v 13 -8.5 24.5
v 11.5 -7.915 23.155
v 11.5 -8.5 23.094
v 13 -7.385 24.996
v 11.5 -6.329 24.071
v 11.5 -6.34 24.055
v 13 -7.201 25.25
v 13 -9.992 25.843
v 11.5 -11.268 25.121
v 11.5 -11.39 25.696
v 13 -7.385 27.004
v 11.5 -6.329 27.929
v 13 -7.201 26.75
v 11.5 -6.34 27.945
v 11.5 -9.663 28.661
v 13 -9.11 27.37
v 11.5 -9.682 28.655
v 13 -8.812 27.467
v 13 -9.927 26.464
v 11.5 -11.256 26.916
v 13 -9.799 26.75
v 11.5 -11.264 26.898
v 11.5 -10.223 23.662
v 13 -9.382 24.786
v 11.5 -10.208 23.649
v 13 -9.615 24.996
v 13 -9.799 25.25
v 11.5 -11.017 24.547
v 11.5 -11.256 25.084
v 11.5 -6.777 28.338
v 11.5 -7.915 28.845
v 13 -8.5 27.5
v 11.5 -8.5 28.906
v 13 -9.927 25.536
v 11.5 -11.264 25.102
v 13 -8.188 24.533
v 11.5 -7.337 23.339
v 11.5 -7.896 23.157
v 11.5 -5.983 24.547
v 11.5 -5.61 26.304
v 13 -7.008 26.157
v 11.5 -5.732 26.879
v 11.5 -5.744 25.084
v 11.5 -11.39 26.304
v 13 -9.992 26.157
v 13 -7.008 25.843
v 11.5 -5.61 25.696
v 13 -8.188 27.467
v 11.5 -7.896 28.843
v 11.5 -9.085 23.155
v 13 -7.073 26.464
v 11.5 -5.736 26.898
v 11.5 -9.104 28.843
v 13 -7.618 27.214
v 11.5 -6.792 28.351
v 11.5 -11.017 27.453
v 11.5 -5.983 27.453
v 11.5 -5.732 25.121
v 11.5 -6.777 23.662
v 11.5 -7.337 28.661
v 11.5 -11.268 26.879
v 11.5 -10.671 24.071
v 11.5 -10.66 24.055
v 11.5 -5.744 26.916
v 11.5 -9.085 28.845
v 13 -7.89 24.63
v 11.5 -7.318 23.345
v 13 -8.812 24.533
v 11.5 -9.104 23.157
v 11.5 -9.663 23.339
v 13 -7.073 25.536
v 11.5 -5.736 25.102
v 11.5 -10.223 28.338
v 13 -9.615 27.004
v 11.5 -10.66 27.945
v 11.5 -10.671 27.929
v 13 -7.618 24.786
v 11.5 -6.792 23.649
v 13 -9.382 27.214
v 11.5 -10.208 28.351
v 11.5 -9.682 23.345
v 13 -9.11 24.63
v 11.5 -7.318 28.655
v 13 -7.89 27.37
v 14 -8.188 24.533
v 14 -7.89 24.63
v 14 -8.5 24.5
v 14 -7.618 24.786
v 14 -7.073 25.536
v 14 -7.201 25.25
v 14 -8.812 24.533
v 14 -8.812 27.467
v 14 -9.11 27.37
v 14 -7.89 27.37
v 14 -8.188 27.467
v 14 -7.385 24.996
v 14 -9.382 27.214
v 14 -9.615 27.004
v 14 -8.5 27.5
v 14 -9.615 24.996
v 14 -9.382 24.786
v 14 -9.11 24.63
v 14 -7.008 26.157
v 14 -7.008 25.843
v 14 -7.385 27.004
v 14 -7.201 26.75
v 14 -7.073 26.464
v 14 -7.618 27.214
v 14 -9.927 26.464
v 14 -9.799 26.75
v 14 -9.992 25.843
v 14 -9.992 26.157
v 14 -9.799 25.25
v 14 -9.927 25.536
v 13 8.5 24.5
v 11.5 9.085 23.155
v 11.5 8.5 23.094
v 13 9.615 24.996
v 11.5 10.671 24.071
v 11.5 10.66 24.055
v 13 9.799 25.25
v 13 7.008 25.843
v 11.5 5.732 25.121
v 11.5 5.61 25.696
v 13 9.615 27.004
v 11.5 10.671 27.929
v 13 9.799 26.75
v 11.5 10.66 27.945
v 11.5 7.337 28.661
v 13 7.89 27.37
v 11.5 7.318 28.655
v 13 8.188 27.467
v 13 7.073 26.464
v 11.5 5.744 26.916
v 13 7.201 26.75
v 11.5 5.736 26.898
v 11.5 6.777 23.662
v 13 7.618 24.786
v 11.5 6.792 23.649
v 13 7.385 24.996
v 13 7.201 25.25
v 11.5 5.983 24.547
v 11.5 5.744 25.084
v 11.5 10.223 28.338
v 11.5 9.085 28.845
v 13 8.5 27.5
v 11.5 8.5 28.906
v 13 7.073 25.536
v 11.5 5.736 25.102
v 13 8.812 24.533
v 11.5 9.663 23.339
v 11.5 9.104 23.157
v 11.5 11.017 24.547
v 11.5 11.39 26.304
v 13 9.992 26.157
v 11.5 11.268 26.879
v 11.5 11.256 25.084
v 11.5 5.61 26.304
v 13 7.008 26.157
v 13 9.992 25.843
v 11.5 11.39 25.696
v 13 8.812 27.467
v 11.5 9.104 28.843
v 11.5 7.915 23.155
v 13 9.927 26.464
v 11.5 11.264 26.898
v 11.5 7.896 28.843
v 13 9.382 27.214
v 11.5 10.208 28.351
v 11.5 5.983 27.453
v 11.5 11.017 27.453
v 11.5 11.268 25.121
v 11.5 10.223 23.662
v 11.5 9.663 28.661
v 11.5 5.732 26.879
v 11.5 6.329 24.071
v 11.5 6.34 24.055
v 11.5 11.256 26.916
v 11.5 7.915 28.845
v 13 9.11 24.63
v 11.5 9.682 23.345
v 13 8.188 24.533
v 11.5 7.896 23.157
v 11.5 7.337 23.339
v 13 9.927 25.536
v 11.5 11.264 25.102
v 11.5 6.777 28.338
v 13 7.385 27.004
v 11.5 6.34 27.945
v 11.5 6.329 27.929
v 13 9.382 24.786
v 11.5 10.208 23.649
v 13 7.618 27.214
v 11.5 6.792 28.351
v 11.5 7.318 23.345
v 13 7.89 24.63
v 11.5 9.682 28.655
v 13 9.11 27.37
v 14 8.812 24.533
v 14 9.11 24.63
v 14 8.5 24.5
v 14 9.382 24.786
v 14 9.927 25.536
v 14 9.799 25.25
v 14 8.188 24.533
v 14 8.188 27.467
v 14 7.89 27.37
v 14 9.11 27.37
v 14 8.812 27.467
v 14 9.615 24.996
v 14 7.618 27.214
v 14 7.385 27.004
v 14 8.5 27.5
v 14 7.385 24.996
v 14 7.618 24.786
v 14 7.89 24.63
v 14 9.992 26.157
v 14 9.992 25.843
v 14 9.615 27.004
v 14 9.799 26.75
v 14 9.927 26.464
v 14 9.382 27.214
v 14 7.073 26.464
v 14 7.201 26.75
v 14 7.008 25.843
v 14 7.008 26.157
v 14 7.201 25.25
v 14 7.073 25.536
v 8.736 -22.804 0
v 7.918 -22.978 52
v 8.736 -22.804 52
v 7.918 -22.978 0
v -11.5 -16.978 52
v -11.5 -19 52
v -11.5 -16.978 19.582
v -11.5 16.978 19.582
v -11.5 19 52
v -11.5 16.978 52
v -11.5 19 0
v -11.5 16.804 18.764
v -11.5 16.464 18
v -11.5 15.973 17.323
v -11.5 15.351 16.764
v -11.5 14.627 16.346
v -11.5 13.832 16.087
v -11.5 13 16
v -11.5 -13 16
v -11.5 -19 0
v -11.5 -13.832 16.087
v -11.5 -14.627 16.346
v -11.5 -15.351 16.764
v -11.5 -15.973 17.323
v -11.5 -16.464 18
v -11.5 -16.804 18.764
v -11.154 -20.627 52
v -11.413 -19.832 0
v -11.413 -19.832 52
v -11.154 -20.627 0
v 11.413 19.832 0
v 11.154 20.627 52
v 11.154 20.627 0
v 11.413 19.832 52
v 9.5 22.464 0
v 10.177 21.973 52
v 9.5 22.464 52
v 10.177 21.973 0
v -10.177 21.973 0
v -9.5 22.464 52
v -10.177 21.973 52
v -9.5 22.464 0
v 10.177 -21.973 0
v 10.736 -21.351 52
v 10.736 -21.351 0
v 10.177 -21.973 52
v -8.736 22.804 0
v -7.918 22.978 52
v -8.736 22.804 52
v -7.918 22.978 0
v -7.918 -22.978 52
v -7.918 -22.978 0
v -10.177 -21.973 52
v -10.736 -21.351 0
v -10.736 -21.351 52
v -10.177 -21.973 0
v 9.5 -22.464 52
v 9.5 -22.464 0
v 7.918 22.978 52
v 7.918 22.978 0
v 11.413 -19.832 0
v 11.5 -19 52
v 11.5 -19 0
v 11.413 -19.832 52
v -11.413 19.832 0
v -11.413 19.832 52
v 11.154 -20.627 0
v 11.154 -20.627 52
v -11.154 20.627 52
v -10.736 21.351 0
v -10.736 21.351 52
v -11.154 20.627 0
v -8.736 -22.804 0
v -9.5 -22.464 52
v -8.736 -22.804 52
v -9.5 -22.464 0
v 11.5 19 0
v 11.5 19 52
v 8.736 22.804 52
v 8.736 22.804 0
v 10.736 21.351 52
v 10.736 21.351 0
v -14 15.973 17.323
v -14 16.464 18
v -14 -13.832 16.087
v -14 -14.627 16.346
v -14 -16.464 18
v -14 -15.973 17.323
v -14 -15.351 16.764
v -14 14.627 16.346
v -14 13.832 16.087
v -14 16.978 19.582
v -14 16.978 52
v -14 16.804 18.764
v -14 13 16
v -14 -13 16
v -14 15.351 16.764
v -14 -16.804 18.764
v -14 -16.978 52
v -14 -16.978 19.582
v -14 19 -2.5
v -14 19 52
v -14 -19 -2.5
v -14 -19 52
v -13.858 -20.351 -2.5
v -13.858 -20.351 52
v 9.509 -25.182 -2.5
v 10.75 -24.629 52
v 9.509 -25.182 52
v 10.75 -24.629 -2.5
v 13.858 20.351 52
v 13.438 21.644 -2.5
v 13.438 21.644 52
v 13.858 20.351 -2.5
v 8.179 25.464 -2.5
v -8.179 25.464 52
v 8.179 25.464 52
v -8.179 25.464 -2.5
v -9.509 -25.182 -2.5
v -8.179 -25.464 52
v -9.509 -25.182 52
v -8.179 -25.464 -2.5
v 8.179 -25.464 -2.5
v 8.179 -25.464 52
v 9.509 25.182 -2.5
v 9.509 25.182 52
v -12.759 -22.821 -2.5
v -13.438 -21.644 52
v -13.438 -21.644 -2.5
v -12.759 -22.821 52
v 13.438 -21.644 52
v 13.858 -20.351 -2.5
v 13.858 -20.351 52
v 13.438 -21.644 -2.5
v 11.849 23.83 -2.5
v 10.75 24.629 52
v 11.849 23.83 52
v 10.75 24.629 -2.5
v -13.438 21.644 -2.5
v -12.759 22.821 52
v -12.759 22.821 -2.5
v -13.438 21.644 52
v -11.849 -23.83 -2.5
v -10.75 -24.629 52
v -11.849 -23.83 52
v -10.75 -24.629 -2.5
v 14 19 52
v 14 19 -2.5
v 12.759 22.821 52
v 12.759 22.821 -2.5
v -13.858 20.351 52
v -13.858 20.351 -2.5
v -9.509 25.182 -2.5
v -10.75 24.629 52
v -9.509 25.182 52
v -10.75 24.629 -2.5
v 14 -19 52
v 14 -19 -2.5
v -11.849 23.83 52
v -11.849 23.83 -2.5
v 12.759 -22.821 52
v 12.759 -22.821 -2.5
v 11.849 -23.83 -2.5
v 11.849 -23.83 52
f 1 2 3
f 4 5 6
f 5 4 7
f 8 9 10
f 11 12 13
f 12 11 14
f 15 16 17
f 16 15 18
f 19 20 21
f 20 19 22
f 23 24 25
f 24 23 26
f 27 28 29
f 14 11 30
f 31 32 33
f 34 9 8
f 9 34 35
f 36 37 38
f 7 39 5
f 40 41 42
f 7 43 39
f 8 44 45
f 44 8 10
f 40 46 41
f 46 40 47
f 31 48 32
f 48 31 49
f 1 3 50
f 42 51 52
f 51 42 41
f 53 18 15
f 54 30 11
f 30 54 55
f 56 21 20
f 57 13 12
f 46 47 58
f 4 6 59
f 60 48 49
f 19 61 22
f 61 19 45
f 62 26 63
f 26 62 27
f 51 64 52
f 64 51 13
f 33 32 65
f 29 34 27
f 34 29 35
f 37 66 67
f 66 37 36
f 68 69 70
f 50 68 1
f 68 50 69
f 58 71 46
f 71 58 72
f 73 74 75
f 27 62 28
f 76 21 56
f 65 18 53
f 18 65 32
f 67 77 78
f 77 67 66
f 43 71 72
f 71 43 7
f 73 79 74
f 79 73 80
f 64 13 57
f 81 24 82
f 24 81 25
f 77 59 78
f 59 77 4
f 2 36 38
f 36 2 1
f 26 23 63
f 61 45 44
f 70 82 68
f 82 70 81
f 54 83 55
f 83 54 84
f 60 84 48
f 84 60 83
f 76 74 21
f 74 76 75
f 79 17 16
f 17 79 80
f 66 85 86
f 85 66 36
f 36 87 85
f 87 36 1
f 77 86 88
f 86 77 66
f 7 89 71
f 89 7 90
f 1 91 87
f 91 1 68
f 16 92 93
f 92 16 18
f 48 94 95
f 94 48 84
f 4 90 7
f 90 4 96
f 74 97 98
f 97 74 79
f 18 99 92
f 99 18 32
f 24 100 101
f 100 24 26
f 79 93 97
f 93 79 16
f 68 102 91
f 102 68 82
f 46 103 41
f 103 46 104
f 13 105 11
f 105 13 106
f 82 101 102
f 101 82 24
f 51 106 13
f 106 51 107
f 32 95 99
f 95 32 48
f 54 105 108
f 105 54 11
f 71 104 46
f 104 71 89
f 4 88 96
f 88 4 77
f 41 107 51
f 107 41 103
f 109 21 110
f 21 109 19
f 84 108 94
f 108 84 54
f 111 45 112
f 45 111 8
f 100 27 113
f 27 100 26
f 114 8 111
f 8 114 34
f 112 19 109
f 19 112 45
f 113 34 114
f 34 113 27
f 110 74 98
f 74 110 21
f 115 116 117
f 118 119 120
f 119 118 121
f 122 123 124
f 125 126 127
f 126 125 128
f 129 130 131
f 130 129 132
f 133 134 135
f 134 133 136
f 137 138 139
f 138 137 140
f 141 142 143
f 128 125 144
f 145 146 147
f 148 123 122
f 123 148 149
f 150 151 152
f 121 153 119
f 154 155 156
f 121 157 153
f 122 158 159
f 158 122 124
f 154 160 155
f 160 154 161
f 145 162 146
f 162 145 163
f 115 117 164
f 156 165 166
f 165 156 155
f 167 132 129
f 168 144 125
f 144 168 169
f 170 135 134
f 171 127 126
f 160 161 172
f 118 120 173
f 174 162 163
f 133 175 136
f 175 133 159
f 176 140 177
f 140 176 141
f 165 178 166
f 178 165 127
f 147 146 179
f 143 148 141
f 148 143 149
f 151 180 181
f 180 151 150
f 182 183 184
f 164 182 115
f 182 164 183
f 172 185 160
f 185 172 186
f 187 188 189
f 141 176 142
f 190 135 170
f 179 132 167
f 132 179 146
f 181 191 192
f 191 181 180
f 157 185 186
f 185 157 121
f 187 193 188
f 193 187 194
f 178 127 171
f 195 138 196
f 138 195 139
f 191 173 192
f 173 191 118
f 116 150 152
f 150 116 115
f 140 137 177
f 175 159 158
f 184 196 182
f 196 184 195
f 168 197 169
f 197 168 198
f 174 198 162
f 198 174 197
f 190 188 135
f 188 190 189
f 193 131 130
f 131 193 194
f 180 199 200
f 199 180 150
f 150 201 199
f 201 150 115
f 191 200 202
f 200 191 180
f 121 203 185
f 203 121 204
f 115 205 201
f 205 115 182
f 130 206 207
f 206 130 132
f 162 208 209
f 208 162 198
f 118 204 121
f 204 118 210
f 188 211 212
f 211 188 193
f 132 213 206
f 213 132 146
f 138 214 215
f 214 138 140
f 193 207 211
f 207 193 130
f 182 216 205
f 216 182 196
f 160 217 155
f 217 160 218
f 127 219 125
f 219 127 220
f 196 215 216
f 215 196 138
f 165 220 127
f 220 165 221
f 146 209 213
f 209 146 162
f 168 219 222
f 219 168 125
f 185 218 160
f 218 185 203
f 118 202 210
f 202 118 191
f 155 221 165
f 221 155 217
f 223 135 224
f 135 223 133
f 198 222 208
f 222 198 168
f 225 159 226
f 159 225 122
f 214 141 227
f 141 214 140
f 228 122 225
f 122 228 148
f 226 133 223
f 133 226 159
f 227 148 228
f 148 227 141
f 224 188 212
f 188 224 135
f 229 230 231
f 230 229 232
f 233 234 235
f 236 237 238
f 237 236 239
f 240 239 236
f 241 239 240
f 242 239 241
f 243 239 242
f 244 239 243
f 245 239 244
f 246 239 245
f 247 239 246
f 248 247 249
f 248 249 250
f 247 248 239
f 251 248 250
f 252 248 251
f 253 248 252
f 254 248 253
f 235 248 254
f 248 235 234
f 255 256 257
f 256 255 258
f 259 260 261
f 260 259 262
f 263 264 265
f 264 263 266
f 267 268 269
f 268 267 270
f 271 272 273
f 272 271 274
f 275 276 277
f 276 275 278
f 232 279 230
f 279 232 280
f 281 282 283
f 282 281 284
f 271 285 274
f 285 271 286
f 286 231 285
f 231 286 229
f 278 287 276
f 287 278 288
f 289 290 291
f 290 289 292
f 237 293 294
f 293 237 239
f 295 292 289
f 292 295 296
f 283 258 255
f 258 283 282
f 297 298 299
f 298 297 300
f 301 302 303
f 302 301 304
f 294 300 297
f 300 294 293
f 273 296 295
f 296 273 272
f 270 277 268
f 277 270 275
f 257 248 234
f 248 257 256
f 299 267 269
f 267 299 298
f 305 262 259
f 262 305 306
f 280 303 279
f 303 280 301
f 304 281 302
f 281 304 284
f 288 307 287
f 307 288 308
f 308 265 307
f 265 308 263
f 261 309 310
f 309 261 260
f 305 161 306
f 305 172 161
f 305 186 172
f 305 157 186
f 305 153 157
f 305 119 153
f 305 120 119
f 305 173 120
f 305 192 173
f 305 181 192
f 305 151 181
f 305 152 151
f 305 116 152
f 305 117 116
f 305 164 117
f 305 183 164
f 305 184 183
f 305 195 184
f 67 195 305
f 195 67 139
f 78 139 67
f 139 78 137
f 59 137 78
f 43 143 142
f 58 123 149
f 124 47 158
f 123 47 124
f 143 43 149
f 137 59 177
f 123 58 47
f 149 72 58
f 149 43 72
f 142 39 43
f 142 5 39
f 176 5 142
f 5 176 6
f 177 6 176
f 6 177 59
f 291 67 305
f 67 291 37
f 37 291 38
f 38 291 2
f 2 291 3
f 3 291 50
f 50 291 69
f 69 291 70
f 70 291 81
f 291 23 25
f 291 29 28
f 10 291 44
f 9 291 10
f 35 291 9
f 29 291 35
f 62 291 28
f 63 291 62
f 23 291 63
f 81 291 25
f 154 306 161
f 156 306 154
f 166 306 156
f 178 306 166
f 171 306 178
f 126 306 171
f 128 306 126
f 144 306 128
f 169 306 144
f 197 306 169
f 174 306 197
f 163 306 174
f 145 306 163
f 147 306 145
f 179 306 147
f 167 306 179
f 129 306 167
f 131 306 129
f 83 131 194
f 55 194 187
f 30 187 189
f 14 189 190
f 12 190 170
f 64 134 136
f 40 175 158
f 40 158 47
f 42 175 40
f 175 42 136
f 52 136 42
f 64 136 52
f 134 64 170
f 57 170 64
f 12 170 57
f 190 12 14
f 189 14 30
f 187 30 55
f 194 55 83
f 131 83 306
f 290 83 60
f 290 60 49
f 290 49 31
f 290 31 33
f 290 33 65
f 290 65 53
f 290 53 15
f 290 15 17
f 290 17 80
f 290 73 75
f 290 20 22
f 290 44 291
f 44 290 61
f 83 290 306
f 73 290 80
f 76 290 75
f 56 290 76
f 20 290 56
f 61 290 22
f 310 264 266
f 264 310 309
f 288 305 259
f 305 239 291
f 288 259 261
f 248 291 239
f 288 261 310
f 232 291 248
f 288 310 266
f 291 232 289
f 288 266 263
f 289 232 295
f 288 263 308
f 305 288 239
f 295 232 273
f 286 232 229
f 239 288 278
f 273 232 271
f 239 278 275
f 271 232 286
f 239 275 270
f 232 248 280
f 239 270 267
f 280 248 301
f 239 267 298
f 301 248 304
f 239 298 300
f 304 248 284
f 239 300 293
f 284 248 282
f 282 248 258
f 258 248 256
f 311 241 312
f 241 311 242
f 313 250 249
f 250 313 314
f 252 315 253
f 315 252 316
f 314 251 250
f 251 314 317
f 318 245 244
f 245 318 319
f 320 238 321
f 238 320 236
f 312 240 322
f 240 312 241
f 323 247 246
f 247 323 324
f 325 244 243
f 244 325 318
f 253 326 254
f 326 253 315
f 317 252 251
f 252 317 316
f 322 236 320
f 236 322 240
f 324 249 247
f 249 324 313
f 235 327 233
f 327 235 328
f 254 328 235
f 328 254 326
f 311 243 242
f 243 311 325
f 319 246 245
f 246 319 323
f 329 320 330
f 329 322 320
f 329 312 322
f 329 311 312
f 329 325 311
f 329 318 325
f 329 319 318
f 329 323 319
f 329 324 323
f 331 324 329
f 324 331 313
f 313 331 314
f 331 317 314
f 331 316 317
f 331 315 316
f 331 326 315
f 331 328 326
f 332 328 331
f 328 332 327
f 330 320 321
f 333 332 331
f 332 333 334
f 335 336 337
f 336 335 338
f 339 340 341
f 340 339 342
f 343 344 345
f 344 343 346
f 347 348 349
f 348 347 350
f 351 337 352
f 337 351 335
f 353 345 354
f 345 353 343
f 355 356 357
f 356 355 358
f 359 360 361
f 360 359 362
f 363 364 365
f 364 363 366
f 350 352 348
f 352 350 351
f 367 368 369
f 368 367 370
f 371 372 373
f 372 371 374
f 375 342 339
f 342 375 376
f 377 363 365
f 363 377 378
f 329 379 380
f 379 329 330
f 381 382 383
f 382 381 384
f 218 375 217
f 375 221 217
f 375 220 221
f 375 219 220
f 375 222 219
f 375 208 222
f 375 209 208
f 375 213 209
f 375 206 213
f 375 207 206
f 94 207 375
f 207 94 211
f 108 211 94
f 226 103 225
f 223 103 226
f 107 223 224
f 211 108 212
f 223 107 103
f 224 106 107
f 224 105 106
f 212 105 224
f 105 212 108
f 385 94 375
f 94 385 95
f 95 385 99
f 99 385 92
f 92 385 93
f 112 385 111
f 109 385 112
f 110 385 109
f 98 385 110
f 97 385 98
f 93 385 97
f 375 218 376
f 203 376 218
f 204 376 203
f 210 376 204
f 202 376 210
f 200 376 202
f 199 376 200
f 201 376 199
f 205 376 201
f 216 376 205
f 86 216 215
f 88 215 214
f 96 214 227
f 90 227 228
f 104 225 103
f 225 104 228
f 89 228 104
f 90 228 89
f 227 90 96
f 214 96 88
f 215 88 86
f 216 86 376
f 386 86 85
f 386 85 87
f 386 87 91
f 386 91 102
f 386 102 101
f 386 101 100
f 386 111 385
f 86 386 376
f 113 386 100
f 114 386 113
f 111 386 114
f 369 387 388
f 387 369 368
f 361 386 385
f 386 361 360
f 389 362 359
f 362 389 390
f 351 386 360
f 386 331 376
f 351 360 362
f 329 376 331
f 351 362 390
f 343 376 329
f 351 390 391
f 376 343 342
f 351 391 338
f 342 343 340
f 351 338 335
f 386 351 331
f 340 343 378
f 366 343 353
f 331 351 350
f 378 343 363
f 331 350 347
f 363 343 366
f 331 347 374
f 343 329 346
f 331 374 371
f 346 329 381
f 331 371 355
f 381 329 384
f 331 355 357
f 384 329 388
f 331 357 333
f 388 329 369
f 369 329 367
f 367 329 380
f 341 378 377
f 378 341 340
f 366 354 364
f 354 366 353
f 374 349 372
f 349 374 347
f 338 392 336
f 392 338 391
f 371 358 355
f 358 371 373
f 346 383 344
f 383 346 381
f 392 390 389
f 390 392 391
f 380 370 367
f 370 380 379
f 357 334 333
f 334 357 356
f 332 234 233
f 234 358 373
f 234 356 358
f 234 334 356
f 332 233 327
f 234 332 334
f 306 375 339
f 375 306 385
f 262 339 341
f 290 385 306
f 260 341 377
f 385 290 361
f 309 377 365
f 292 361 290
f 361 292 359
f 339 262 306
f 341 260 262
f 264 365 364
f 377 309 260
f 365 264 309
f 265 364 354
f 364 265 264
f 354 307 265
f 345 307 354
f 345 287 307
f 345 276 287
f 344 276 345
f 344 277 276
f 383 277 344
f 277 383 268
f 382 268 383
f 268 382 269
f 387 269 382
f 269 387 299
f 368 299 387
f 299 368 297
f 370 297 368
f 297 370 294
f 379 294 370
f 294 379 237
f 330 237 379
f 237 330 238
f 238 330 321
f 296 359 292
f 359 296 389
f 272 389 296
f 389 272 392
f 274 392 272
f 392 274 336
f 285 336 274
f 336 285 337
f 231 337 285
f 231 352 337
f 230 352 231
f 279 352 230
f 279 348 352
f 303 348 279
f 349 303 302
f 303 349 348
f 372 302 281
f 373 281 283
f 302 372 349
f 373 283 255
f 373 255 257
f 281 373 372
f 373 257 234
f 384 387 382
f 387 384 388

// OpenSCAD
//
//  wall holder for aircond remote control
//
//  design by egil kvaleberg, 5 october 2016
//
//  added support for chamfer
//

// size of compartment
comp_w = 46;
comp_d = 23;
comp_h = 52;
// width of front slot
slot_w = 34;
// width of slot lower lip
slot_lower = 16; 
// corner radius of compartment
corner_r = 4;
// wall thickness of comparement
wall = 2.5;
// chamfer for top entry and bottom (typical value is 0.6)
chamfer = 0.0; // [0.0:0.1:2.0]
// diameter of mounting screws
mnt_dia = 2.5;

// generic tolerance
tol = 0.25;

d = 1*0.1;

module add() {
    // chamfered bottom section
    if (chamfer > 0) hull() for (sx = [-1,1]) for (sy = [-1,1]) 
        translate([sx*(comp_d/2-corner_r),sy*(comp_w/2-corner_r),-wall]) {
            cylinder(r1=wall+corner_r-chamfer, r2=wall+corner_r, h=chamfer, $fn=30);
        }   
    // main section    
    hull() for (sx = [-1,1]) for (sy = [-1,1]) 
        translate([sx*(comp_d/2-corner_r),sy*(comp_w/2-corner_r),chamfer-wall]) {
            cylinder(r=wall+corner_r, h=wall+comp_h-chamfer, $fn=30);
        }   
}

module sub() {
    // main compartment 
    hull () for (sx = [-1,1]) for (sy = [-1,1]) 
        translate([sx*(comp_d/2-corner_r),sy*(comp_w/2-corner_r),0]) {
            cylinder(r=corner_r, h=comp_h+d, $fn=30);
    }
    // main compartment, chamfered section
    if (chamfer > 0) hull () for (sx = [-1,1]) for (sy = [-1,1]) 
        translate([sx*(comp_d/2-corner_r),sy*(comp_w/2-corner_r),comp_h-chamfer]) {
            translate([0,0,]) cylinder(r1=corner_r, r2=corner_r+chamfer+d, h=chamfer+d, $fn=30);
    }
    // slot in front
    translate ([0,0,slot_lower+comp_h/2]) rotate([0,-90,0]) hull () for (sx = [-1,1]) for (sy = [-1,1]) 
        translate([sx*(comp_h/2-corner_r),sy*(slot_w/2-corner_r),0]) {
            cylinder(r=corner_r, h=comp_h+d, $fn=30);
    }
    // mounting holes
    translate ([comp_d/2-d,0,comp_h/2]) rotate([0,90,0]) for (sy = [-1,1]) 
        translate([0,sy*slot_w/4,0]) {
            cylinder(d1=mnt_dia+2*tol+2*wall*0.6, d2=mnt_dia+2*tol, h=d+wall*0.6, $fn=30);
            cylinder(d=mnt_dia+2*tol, h=d+wall+d, $fn=30);
    }   
}
    // mounting holes
    if (0) color("red") translate ([comp_d/2-d,0,comp_h/2]) rotate([0,90,0]) for (sy = [-1,1]) 
        translate([0,sy*slot_w/4,0]) {
            cylinder(d=mnt_dia+2*tol, h=d+wall+d, $fn=30);
    } 

    // main structure:
    difference () {
        color("red") add();
        difference () {
            sub();
            //
        }
    }
